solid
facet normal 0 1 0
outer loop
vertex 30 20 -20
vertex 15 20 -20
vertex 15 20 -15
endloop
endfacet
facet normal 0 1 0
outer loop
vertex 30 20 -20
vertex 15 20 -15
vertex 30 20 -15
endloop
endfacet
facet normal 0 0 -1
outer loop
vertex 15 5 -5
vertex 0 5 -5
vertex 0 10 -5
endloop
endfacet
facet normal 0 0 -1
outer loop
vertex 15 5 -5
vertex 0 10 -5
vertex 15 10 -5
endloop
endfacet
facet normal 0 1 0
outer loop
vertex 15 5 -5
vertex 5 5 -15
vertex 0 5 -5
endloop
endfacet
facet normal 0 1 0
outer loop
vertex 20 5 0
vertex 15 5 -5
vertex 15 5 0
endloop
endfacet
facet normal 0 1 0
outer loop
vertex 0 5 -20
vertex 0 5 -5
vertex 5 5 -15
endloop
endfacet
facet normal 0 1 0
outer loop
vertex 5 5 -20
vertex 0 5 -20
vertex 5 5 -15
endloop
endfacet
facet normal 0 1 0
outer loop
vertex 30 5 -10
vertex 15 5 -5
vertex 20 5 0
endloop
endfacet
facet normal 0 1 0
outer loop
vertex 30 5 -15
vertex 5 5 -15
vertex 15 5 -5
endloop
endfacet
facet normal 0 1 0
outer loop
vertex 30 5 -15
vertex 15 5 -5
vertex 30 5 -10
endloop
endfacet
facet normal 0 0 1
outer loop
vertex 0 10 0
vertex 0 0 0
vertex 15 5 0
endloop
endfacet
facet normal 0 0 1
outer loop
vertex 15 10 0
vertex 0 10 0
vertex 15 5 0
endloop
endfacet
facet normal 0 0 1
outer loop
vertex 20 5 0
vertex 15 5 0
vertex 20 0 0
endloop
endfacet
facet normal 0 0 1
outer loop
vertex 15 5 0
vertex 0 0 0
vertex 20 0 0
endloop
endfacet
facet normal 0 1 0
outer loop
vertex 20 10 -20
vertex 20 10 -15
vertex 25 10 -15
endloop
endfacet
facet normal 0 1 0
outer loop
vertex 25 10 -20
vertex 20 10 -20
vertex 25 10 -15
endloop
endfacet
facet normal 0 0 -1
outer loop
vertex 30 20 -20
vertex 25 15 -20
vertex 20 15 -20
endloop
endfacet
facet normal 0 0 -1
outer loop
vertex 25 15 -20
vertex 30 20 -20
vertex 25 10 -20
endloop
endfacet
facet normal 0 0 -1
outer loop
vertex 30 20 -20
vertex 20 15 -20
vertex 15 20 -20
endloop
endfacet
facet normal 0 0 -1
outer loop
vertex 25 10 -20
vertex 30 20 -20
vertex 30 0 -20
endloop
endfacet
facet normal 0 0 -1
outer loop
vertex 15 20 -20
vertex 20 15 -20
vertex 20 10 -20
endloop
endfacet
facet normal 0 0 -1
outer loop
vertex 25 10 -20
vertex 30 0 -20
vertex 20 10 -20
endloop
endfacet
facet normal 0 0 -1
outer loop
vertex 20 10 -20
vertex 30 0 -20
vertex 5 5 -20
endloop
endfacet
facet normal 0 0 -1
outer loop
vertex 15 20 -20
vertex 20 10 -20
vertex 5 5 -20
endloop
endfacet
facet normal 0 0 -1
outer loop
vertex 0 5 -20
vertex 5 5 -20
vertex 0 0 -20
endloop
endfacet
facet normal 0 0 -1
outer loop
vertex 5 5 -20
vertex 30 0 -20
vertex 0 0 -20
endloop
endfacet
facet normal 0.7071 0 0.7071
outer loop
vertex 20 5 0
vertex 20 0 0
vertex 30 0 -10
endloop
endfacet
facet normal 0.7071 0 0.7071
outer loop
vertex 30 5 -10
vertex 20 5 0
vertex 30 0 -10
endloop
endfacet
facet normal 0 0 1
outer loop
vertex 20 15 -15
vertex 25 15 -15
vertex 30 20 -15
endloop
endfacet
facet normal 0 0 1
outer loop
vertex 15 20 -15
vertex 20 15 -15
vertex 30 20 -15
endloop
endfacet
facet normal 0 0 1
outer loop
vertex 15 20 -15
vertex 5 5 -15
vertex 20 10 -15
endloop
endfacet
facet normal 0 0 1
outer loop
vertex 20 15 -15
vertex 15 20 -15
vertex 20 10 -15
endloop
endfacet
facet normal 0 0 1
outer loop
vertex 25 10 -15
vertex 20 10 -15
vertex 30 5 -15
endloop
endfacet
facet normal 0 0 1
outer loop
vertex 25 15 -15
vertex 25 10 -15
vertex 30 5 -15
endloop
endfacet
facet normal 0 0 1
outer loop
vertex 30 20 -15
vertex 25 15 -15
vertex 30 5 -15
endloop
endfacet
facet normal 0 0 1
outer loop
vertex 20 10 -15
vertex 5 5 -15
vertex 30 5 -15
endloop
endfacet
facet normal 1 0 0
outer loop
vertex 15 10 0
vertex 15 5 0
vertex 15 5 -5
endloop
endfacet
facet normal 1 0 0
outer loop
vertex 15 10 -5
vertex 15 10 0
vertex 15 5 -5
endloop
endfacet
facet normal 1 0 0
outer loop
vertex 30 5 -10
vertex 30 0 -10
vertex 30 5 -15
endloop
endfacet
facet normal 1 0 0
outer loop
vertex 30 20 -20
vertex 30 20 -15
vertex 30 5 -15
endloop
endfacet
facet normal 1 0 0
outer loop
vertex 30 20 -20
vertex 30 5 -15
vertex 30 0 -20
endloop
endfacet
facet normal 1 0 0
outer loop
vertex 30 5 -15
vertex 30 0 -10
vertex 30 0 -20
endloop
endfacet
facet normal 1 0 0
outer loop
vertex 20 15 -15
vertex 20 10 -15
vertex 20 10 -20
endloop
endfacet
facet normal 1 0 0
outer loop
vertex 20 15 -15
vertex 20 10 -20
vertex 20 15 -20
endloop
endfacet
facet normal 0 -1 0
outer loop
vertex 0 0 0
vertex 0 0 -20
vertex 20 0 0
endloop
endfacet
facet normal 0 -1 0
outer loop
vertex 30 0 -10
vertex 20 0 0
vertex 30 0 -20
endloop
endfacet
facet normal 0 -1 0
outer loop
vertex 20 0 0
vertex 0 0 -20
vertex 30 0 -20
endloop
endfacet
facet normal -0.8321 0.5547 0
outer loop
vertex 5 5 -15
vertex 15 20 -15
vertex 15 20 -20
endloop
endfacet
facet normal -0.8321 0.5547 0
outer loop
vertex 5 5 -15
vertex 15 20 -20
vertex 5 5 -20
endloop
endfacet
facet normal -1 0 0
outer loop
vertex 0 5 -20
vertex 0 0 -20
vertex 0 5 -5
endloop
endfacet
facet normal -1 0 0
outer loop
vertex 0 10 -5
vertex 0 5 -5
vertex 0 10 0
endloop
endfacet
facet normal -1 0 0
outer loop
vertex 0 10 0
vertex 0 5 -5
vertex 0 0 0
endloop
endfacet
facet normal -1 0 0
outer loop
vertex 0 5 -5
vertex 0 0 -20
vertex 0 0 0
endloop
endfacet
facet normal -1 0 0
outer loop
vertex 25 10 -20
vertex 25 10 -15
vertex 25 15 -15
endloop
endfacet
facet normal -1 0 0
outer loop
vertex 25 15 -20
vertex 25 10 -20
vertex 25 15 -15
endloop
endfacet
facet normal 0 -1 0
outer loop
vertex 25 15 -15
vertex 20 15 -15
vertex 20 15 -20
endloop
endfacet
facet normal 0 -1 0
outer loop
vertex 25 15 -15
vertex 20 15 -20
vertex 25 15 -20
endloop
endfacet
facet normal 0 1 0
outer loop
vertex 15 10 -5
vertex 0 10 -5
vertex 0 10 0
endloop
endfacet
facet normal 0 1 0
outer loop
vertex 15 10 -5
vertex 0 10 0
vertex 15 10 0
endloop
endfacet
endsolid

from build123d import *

# Parameters (mm, degrees)
EXTRUDE_1_DEPTH     = 5
SKETCH_1_3_W        = 15
SKETCH_1_3_H        = 5
EXTRUDE_2_DEPTH     = 10
SKETCH_1_4_W        = 25
SKETCH_1_4_H        = 5
EXTRUDE_3_DEPTH     = 20
SKETCH_2_W          = 5
SKETCH_2_H          = 5
CUT_EXTRUDE_1_DEPTH = 20


with BuildPart() as part:
    # 草圖1 → 填料-伸長1 (new body)
    with BuildSketch(Plane(origin=(0, 0, 0), x_dir=(1, 0, 0), z_dir=(0, 1, 0))):
        Polygon((20, 0), (30, 10), (30, 20), (0, 20), (0, 0), align=None)
    extrude(amount=EXTRUDE_1_DEPTH)

    # 草圖1<3> → 填料-伸長2 (add)
    with BuildSketch(Plane(origin=(0, 0, 0), x_dir=(1, 0, 0), z_dir=(0, 1, 0))):
        with Locations((7.5, 2.5)):
            Rectangle(SKETCH_1_3_W, SKETCH_1_3_H)
    extrude(amount=EXTRUDE_2_DEPTH)

    # 草圖1<4> → 填料-伸長3 (add)
    with BuildSketch(Plane(origin=(0, 0, 0), x_dir=(1, 0, 0), z_dir=(0, 1, 0))):
        with Locations((17.5, 17.5)):
            Rectangle(SKETCH_1_4_W, SKETCH_1_4_H)
    extrude(amount=EXTRUDE_3_DEPTH)

    # 草圖2 → 除料-伸長1 (cut)
    with BuildSketch(Plane.XY.offset(-15)):
        with Locations((22.5, 12.5)):
            Rectangle(SKETCH_2_W, SKETCH_2_H)
        Polygon((5, 20), (15, 20), (5, 5), align=None)
    extrude(amount=-CUT_EXTRUDE_1_DEPTH, mode=Mode.SUBTRACT)


solid = part.part
